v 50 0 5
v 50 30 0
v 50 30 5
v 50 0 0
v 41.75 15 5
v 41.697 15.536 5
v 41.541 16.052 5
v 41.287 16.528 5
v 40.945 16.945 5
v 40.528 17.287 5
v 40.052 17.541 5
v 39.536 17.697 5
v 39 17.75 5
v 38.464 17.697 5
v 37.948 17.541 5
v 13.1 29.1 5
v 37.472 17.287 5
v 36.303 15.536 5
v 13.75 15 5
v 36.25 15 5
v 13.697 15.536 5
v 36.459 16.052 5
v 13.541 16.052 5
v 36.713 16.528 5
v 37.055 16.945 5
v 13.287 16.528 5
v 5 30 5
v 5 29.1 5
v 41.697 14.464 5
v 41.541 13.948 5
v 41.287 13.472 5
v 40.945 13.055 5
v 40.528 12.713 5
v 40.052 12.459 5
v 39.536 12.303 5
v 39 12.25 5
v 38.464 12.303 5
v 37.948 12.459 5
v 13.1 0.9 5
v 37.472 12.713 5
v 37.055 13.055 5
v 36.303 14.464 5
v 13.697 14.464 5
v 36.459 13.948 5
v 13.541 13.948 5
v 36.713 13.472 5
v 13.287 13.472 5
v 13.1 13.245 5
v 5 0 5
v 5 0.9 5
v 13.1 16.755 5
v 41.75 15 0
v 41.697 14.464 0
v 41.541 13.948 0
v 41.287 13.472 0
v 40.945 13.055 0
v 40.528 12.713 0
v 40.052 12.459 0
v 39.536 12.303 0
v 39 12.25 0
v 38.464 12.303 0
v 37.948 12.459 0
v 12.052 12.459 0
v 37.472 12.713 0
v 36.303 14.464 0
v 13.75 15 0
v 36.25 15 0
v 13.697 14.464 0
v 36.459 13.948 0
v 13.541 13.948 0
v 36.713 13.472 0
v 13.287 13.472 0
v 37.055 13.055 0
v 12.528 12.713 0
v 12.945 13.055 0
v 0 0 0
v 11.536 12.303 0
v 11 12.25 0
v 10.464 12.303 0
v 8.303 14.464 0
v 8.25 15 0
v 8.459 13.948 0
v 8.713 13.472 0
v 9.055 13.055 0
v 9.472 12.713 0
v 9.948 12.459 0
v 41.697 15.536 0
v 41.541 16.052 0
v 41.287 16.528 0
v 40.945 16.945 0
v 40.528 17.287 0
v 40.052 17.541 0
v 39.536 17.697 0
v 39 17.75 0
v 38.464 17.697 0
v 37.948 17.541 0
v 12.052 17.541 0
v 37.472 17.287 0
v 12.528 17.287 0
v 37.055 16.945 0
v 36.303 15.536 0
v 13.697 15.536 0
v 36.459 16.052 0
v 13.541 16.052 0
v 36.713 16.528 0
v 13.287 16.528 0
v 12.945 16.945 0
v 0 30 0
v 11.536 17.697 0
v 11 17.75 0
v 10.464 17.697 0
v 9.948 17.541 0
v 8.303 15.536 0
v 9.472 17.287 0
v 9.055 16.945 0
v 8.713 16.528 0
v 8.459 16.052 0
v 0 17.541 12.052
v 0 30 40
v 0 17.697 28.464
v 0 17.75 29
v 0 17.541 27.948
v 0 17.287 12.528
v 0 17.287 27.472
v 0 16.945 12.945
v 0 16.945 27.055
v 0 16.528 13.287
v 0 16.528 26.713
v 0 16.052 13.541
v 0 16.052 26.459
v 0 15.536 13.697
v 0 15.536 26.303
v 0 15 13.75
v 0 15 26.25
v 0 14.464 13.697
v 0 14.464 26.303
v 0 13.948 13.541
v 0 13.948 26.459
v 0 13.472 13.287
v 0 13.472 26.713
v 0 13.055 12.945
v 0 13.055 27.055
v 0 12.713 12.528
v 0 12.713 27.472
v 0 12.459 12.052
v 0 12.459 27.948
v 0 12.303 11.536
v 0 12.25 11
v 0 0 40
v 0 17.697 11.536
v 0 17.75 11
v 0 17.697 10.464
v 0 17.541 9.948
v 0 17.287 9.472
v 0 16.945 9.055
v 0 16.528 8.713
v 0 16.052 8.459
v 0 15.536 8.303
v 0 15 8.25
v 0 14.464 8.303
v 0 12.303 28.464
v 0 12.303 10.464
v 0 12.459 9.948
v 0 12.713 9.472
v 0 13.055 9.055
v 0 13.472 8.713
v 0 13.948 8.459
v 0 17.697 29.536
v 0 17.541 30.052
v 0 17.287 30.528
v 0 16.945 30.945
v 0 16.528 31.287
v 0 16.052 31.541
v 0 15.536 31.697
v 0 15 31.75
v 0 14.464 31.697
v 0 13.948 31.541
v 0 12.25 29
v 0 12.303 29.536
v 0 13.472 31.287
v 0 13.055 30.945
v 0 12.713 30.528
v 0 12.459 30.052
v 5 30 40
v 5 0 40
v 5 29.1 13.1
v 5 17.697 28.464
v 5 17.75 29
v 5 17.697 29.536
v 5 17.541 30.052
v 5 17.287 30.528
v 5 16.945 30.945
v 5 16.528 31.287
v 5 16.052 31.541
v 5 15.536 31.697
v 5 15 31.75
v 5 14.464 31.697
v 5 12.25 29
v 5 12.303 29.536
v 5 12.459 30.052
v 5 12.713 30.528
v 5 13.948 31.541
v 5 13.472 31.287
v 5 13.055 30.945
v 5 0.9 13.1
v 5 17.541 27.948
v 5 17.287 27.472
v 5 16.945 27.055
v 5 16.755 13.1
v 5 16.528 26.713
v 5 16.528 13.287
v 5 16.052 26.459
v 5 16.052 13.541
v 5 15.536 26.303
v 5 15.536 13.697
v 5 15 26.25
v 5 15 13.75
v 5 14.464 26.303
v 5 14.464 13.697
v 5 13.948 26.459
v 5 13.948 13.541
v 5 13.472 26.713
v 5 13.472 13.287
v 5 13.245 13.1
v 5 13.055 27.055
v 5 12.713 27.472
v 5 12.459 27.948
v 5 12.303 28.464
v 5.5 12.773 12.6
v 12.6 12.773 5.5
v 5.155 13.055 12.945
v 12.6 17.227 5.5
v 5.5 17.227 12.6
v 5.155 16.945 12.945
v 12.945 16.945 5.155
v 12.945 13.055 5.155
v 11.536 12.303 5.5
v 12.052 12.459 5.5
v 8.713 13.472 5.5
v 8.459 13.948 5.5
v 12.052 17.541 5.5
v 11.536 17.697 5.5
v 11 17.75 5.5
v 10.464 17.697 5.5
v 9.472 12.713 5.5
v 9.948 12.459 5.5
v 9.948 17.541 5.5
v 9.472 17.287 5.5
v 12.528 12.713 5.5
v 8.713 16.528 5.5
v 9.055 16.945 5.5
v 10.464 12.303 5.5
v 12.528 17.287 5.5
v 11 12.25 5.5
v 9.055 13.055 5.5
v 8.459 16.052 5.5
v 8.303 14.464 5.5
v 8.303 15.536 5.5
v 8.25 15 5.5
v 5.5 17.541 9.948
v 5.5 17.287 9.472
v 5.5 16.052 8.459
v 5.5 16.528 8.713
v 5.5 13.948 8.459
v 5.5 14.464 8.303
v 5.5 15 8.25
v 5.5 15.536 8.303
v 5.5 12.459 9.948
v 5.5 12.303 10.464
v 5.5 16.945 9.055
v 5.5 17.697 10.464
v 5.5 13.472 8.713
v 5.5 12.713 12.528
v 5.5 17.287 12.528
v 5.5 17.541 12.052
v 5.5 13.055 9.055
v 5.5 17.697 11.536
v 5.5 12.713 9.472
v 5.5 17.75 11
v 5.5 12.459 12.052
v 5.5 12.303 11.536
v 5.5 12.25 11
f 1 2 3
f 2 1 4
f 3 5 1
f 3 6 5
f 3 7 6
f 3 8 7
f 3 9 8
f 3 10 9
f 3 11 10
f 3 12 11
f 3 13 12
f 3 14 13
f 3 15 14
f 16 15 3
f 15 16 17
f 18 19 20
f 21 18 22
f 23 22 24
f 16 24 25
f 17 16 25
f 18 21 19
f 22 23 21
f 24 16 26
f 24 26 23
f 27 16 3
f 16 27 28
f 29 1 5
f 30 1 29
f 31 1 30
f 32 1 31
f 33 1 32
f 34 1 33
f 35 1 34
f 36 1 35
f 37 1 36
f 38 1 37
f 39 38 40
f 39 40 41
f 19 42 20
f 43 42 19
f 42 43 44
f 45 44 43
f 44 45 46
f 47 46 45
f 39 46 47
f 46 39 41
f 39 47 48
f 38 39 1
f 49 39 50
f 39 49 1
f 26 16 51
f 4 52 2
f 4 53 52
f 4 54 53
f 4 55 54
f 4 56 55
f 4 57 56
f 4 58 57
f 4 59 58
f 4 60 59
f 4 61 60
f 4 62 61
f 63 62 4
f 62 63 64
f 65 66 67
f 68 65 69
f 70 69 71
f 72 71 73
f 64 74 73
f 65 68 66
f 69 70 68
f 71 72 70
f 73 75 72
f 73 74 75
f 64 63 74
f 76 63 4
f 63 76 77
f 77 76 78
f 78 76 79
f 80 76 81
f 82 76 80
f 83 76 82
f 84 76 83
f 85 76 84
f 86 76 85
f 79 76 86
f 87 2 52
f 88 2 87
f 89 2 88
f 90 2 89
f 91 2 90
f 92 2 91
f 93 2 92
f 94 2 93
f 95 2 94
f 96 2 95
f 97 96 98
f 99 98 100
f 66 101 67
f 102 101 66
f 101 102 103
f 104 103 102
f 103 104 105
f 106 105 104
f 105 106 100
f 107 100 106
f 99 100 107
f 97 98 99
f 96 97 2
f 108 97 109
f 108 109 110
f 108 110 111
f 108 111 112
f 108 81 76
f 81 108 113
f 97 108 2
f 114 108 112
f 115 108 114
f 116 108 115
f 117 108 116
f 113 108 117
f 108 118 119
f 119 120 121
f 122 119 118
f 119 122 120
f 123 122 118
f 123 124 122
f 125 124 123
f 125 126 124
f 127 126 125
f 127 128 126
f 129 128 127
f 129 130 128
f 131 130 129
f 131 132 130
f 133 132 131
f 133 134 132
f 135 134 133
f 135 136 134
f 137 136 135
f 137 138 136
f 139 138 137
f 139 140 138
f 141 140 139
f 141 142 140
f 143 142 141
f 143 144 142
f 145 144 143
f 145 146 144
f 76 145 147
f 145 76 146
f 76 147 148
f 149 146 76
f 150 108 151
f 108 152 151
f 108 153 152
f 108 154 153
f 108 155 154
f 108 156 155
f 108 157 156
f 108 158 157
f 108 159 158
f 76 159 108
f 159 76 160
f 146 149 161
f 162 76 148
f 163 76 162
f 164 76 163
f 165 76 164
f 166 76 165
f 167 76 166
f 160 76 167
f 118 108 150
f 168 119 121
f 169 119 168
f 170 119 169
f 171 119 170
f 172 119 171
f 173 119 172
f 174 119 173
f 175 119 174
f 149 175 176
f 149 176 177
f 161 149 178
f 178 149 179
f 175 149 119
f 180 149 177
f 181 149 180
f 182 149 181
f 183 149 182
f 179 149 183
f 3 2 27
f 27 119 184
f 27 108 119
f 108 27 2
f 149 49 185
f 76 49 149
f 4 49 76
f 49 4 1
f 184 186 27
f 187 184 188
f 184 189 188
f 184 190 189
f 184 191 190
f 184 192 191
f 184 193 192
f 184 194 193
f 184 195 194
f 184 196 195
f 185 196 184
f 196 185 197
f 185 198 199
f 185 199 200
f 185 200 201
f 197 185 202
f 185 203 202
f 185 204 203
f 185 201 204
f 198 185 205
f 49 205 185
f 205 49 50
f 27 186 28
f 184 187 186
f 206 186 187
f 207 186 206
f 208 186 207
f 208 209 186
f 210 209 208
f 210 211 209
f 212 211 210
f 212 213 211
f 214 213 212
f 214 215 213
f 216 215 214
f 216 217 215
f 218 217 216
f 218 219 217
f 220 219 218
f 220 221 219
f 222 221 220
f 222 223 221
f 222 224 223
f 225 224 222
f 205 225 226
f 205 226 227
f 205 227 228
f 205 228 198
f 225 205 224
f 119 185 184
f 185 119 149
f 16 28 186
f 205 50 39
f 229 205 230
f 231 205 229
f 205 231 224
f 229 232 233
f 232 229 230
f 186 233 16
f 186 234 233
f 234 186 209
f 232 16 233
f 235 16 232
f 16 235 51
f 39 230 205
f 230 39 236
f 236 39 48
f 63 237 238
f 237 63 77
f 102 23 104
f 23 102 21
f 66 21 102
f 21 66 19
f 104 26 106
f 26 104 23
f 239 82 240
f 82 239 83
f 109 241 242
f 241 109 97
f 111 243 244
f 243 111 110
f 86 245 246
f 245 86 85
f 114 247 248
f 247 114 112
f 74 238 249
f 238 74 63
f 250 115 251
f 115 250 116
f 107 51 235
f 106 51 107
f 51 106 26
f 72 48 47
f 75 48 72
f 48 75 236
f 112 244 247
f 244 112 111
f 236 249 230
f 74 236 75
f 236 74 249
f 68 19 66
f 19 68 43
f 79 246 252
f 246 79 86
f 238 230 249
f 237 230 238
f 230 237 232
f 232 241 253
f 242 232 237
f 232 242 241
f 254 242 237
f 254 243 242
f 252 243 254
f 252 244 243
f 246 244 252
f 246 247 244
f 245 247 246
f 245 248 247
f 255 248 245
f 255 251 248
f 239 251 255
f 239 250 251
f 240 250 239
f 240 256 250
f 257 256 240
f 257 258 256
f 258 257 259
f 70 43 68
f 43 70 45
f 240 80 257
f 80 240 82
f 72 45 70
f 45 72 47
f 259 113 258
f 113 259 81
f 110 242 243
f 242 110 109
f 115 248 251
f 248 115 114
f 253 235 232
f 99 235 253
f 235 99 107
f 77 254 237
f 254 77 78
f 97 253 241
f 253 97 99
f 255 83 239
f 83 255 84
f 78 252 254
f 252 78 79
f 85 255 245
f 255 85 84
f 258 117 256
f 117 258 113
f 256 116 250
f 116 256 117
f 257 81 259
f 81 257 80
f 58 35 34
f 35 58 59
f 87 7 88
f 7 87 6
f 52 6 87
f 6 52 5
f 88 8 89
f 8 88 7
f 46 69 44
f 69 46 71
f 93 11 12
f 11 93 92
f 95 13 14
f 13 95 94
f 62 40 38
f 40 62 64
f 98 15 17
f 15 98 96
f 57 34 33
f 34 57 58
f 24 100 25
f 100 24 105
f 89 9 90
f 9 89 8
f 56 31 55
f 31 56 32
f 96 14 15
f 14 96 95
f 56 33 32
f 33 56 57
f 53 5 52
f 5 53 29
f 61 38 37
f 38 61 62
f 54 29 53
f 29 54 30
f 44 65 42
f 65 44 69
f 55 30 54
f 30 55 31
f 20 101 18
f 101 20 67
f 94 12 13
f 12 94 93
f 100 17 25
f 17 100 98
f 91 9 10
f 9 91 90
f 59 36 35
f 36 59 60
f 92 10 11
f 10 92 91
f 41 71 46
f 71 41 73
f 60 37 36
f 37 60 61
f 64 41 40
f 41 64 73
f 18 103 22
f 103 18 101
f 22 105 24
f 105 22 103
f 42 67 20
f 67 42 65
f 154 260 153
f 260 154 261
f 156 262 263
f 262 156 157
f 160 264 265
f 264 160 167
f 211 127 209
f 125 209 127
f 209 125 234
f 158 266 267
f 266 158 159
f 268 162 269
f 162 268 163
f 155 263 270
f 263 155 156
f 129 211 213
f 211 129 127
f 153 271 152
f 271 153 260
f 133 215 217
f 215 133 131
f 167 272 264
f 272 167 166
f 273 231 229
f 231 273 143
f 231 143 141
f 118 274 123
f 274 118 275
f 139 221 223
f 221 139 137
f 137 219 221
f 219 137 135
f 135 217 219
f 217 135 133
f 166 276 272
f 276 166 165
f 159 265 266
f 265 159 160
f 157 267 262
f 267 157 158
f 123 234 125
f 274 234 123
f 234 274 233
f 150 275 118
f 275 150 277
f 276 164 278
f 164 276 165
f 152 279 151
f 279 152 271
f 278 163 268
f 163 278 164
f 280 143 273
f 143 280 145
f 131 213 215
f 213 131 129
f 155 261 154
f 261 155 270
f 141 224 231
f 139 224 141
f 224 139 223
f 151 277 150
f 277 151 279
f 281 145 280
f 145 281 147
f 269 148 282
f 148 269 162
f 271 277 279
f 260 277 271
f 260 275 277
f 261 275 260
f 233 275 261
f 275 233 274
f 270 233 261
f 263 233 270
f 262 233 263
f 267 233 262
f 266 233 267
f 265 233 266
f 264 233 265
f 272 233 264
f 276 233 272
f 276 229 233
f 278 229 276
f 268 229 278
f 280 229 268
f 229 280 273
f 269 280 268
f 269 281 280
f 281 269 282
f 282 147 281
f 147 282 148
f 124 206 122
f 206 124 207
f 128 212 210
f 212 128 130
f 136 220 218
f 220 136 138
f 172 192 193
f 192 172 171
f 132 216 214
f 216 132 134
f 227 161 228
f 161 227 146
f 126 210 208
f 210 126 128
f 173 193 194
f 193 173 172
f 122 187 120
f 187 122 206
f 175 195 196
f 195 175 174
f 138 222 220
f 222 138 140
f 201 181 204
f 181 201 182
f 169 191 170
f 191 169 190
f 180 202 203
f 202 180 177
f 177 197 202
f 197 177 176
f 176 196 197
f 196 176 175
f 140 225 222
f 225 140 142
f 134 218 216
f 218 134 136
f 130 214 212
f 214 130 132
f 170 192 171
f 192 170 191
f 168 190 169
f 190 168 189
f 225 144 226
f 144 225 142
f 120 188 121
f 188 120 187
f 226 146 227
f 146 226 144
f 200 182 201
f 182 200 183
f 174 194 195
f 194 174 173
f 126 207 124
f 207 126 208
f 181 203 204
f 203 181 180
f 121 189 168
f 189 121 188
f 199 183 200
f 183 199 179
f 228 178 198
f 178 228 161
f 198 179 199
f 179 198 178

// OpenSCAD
$fn = 32;

// ----------------------------------------------------------------------
// L-bracket: 50 x 30 x 40 mm
// ----------------------------------------------------------------------

// --- parameters (mm) ---
base_len = 50;            // horizontal leg, X
upright_h = 40;           // vertical leg, Z
flange_w = 30;            // bracket depth, Y
mat_t = 5;                // plate thickness
hole_d = 5.5;             // clearance for M5
rib_leg = 17.2;           // gusset leg
rib_sink = 0.9;           // gusset overlap into the plates

module hole_z(px, py) {
  translate([px, py, -0.5]) cylinder(h = mat_t + 1, d = hole_d);
}
module hole_x(pz, py) {
  translate([-0.5, py, pz]) rotate([0, 90, 0]) cylinder(h = mat_t + 1, d = hole_d);
}
module gusset() {
  translate([0, flange_w - rib_sink, 0])
    rotate([90, 0, 0])
      linear_extrude(height = flange_w - 2 * rib_sink)
        polygon(points = [[rib_sink, rib_sink], [rib_leg, rib_sink], [rib_sink, rib_leg]]);
}

difference() {
  union() {
    /* horizontal leg */
    cube([base_len, flange_w, mat_t]);
    /* vertical leg, overlapping the corner block */
    cube([mat_t, flange_w, upright_h]);
    gusset();
  }
  hole_z(11, 15);
  hole_z(39, 15);
  hole_x(11, 15);
  hole_x(29, 15);
}
